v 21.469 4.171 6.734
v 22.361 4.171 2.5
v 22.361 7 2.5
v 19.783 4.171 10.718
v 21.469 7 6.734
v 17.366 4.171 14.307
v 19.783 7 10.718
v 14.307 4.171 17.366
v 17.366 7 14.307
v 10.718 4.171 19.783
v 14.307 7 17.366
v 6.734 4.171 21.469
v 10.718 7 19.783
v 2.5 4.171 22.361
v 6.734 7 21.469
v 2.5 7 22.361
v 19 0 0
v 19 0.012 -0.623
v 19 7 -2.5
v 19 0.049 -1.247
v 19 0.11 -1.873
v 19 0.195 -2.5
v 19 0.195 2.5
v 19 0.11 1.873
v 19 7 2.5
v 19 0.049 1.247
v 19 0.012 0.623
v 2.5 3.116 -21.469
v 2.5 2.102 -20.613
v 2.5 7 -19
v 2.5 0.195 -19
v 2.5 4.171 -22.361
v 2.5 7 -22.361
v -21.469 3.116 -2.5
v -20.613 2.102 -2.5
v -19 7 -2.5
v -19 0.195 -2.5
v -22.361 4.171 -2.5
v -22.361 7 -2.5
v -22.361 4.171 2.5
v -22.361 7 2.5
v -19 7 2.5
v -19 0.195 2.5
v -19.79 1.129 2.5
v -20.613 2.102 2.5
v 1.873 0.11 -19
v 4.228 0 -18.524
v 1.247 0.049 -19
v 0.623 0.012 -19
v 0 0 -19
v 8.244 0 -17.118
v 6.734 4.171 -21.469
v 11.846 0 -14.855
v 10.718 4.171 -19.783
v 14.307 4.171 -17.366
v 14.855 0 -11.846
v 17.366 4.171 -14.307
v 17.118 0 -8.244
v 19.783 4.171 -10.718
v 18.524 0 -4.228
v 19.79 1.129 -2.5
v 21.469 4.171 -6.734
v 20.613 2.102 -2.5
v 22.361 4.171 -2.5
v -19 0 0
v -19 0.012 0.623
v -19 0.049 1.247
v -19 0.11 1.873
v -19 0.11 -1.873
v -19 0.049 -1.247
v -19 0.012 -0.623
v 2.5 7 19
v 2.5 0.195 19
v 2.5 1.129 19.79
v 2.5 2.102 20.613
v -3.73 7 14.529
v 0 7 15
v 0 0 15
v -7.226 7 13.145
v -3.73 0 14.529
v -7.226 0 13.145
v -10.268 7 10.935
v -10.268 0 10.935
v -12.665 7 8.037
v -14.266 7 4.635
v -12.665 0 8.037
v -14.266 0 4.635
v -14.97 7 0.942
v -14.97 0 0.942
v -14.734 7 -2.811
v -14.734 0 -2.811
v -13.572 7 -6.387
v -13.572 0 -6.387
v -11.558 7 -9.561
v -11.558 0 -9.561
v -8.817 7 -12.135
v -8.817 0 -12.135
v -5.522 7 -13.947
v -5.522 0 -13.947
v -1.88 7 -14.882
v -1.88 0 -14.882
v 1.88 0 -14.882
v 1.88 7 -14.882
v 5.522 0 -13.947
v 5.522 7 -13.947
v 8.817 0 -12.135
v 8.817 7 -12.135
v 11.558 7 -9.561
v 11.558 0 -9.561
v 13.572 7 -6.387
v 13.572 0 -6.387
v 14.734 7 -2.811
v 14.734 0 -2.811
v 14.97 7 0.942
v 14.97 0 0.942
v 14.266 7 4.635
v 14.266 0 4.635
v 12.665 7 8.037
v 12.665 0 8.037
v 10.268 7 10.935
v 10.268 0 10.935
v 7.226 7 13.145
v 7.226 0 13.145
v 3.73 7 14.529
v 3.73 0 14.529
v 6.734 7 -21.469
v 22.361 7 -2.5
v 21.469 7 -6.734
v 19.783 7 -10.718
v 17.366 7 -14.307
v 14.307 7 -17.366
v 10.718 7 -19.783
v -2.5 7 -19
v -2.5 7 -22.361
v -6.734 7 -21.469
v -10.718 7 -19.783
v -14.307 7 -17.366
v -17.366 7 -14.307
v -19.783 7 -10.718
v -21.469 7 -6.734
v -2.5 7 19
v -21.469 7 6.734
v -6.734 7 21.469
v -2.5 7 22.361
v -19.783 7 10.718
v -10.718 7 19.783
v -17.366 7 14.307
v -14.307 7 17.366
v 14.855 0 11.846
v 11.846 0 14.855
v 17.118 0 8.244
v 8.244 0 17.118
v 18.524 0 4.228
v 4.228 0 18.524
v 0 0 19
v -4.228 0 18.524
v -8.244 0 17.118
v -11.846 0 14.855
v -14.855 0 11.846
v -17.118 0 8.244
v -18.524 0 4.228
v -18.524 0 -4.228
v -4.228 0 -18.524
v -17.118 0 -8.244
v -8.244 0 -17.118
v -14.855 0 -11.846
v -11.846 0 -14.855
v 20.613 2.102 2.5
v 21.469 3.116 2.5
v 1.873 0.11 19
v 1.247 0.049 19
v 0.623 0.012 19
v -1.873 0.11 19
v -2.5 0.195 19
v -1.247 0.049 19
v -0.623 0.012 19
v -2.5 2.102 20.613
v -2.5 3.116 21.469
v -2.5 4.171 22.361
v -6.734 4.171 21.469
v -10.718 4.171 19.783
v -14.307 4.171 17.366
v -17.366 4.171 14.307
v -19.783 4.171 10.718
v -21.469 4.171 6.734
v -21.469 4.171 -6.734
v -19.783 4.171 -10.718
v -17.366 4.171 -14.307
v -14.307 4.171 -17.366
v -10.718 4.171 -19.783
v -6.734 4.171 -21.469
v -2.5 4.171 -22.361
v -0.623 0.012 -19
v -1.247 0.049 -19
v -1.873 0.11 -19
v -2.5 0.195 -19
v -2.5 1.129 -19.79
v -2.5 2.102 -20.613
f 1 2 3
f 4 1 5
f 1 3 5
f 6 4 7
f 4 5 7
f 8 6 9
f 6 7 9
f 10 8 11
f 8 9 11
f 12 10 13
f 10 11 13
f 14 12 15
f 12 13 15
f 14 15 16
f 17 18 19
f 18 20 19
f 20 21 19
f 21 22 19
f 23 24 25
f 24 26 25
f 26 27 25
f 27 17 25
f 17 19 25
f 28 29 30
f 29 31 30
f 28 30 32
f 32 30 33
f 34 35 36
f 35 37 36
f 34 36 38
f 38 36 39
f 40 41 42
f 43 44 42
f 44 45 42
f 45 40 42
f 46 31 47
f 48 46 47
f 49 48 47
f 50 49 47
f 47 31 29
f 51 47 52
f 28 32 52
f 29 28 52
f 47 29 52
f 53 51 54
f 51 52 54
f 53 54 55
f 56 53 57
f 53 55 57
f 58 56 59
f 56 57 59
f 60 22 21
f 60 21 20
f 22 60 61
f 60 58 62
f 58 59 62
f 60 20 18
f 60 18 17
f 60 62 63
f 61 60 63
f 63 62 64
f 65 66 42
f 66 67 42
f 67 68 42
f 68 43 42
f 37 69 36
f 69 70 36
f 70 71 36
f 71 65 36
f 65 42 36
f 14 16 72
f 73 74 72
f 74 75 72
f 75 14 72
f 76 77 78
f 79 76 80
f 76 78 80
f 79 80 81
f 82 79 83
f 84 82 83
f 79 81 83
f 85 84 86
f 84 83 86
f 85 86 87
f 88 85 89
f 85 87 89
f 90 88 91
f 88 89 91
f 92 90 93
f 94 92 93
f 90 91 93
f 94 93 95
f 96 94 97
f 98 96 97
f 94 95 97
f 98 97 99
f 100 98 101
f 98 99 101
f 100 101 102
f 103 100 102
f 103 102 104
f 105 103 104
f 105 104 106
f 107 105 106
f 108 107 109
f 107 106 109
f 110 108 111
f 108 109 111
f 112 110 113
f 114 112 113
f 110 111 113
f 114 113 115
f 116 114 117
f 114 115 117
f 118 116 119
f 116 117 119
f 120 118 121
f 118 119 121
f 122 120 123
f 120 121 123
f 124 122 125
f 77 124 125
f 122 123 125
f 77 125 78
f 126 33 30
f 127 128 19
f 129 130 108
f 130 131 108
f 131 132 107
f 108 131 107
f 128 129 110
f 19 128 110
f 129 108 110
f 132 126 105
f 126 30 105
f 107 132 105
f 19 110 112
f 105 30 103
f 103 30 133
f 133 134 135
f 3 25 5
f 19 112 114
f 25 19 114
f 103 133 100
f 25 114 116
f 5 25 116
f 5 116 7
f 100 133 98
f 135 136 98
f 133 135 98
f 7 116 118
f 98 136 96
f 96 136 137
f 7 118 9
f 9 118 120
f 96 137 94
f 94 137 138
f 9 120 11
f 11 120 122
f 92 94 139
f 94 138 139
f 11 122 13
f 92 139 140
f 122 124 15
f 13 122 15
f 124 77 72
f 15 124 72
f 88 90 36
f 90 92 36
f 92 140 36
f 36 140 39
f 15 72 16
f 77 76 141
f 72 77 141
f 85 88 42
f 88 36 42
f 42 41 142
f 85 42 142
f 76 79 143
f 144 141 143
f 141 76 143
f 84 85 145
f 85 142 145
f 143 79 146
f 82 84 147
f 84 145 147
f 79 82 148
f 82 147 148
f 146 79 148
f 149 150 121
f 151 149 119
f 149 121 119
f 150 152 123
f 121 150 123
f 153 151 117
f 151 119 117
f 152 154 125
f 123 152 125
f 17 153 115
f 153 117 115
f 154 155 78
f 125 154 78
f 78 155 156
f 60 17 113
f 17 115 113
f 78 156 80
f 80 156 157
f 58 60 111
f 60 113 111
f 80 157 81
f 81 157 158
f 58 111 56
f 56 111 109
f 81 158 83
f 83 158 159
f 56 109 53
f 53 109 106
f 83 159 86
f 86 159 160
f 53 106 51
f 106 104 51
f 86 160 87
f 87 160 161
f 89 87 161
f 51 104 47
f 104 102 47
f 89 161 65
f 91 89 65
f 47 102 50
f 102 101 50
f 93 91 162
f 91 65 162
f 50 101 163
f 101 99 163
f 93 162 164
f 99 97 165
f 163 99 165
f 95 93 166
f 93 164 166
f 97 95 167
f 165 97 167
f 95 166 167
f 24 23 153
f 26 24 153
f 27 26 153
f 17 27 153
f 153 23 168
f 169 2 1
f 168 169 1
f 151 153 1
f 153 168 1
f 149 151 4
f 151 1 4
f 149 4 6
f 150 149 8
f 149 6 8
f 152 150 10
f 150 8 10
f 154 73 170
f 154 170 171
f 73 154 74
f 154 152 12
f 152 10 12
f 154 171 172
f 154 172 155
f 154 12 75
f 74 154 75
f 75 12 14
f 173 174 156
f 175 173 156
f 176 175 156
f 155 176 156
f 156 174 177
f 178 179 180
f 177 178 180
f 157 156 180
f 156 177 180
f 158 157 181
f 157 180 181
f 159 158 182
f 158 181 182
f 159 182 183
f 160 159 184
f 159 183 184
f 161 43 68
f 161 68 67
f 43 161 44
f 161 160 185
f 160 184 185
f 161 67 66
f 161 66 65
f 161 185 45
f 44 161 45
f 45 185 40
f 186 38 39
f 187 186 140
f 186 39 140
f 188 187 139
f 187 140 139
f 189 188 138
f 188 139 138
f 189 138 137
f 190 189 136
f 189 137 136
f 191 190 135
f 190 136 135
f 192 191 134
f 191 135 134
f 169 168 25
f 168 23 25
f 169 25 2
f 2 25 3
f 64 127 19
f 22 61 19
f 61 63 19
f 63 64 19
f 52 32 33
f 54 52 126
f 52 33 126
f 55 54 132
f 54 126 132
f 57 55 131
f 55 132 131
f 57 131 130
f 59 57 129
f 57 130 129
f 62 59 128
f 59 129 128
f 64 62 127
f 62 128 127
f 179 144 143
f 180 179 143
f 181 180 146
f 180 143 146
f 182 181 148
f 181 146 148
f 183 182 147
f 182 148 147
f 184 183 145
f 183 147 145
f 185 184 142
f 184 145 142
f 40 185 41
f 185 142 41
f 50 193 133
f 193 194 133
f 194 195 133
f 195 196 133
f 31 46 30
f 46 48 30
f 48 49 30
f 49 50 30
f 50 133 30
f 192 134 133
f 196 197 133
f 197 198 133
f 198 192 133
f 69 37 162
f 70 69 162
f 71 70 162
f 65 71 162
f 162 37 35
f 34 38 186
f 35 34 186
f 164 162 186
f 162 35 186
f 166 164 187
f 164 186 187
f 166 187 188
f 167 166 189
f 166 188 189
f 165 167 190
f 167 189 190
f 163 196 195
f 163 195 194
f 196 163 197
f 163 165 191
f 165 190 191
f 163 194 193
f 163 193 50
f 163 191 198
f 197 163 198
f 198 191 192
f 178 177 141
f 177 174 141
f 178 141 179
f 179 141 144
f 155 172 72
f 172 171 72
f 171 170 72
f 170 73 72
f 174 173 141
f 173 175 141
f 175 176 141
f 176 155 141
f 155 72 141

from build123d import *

# Parameters (mm, degrees)
NOTCH_DEPTH       = 33.580669115
CIRPATTERN1_COUNT = 4


with BuildPart() as part:
    # Profile → Nut (revolve)
    with BuildSketch(Plane.XY):
        Polygon((15, 7), (15, 0), (19, 0), (22.5, 4.171137574), (22.5, 7), align=None)
    revolve(axis=Axis((0, 25.4, 0), (0, -1, 0)))

    # Cut → Notch (cut, through all)
    with BuildSketch(Plane(origin=(0, 7, 0), x_dir=(-1, 0, 0), z_dir=(0, 1, 0))):
        with BuildLine():
            Line((2.5, -19), (-2.5, -19))
            Line((-2.5, -19), (-2.5, -22.360679775))
            ThreePointArc((-2.5, -22.360679775), (0, -22.5), (2.5, -22.360679775))
            Line((2.5, -22.360679775), (2.5, -19))
        make_face()
    notch = extrude(amount=-NOTCH_DEPTH, mode=Mode.SUBTRACT)

    # CirPattern1: Notch ×4 about axis
    cirpattern1_axis = Axis((0, -9.659760956, 0), (0, 1, 0))
    for i in range(1, CIRPATTERN1_COUNT):
        add(notch.rotate(cirpattern1_axis, i * 360 / CIRPATTERN1_COUNT), mode=Mode.SUBTRACT)


solid = part.part
